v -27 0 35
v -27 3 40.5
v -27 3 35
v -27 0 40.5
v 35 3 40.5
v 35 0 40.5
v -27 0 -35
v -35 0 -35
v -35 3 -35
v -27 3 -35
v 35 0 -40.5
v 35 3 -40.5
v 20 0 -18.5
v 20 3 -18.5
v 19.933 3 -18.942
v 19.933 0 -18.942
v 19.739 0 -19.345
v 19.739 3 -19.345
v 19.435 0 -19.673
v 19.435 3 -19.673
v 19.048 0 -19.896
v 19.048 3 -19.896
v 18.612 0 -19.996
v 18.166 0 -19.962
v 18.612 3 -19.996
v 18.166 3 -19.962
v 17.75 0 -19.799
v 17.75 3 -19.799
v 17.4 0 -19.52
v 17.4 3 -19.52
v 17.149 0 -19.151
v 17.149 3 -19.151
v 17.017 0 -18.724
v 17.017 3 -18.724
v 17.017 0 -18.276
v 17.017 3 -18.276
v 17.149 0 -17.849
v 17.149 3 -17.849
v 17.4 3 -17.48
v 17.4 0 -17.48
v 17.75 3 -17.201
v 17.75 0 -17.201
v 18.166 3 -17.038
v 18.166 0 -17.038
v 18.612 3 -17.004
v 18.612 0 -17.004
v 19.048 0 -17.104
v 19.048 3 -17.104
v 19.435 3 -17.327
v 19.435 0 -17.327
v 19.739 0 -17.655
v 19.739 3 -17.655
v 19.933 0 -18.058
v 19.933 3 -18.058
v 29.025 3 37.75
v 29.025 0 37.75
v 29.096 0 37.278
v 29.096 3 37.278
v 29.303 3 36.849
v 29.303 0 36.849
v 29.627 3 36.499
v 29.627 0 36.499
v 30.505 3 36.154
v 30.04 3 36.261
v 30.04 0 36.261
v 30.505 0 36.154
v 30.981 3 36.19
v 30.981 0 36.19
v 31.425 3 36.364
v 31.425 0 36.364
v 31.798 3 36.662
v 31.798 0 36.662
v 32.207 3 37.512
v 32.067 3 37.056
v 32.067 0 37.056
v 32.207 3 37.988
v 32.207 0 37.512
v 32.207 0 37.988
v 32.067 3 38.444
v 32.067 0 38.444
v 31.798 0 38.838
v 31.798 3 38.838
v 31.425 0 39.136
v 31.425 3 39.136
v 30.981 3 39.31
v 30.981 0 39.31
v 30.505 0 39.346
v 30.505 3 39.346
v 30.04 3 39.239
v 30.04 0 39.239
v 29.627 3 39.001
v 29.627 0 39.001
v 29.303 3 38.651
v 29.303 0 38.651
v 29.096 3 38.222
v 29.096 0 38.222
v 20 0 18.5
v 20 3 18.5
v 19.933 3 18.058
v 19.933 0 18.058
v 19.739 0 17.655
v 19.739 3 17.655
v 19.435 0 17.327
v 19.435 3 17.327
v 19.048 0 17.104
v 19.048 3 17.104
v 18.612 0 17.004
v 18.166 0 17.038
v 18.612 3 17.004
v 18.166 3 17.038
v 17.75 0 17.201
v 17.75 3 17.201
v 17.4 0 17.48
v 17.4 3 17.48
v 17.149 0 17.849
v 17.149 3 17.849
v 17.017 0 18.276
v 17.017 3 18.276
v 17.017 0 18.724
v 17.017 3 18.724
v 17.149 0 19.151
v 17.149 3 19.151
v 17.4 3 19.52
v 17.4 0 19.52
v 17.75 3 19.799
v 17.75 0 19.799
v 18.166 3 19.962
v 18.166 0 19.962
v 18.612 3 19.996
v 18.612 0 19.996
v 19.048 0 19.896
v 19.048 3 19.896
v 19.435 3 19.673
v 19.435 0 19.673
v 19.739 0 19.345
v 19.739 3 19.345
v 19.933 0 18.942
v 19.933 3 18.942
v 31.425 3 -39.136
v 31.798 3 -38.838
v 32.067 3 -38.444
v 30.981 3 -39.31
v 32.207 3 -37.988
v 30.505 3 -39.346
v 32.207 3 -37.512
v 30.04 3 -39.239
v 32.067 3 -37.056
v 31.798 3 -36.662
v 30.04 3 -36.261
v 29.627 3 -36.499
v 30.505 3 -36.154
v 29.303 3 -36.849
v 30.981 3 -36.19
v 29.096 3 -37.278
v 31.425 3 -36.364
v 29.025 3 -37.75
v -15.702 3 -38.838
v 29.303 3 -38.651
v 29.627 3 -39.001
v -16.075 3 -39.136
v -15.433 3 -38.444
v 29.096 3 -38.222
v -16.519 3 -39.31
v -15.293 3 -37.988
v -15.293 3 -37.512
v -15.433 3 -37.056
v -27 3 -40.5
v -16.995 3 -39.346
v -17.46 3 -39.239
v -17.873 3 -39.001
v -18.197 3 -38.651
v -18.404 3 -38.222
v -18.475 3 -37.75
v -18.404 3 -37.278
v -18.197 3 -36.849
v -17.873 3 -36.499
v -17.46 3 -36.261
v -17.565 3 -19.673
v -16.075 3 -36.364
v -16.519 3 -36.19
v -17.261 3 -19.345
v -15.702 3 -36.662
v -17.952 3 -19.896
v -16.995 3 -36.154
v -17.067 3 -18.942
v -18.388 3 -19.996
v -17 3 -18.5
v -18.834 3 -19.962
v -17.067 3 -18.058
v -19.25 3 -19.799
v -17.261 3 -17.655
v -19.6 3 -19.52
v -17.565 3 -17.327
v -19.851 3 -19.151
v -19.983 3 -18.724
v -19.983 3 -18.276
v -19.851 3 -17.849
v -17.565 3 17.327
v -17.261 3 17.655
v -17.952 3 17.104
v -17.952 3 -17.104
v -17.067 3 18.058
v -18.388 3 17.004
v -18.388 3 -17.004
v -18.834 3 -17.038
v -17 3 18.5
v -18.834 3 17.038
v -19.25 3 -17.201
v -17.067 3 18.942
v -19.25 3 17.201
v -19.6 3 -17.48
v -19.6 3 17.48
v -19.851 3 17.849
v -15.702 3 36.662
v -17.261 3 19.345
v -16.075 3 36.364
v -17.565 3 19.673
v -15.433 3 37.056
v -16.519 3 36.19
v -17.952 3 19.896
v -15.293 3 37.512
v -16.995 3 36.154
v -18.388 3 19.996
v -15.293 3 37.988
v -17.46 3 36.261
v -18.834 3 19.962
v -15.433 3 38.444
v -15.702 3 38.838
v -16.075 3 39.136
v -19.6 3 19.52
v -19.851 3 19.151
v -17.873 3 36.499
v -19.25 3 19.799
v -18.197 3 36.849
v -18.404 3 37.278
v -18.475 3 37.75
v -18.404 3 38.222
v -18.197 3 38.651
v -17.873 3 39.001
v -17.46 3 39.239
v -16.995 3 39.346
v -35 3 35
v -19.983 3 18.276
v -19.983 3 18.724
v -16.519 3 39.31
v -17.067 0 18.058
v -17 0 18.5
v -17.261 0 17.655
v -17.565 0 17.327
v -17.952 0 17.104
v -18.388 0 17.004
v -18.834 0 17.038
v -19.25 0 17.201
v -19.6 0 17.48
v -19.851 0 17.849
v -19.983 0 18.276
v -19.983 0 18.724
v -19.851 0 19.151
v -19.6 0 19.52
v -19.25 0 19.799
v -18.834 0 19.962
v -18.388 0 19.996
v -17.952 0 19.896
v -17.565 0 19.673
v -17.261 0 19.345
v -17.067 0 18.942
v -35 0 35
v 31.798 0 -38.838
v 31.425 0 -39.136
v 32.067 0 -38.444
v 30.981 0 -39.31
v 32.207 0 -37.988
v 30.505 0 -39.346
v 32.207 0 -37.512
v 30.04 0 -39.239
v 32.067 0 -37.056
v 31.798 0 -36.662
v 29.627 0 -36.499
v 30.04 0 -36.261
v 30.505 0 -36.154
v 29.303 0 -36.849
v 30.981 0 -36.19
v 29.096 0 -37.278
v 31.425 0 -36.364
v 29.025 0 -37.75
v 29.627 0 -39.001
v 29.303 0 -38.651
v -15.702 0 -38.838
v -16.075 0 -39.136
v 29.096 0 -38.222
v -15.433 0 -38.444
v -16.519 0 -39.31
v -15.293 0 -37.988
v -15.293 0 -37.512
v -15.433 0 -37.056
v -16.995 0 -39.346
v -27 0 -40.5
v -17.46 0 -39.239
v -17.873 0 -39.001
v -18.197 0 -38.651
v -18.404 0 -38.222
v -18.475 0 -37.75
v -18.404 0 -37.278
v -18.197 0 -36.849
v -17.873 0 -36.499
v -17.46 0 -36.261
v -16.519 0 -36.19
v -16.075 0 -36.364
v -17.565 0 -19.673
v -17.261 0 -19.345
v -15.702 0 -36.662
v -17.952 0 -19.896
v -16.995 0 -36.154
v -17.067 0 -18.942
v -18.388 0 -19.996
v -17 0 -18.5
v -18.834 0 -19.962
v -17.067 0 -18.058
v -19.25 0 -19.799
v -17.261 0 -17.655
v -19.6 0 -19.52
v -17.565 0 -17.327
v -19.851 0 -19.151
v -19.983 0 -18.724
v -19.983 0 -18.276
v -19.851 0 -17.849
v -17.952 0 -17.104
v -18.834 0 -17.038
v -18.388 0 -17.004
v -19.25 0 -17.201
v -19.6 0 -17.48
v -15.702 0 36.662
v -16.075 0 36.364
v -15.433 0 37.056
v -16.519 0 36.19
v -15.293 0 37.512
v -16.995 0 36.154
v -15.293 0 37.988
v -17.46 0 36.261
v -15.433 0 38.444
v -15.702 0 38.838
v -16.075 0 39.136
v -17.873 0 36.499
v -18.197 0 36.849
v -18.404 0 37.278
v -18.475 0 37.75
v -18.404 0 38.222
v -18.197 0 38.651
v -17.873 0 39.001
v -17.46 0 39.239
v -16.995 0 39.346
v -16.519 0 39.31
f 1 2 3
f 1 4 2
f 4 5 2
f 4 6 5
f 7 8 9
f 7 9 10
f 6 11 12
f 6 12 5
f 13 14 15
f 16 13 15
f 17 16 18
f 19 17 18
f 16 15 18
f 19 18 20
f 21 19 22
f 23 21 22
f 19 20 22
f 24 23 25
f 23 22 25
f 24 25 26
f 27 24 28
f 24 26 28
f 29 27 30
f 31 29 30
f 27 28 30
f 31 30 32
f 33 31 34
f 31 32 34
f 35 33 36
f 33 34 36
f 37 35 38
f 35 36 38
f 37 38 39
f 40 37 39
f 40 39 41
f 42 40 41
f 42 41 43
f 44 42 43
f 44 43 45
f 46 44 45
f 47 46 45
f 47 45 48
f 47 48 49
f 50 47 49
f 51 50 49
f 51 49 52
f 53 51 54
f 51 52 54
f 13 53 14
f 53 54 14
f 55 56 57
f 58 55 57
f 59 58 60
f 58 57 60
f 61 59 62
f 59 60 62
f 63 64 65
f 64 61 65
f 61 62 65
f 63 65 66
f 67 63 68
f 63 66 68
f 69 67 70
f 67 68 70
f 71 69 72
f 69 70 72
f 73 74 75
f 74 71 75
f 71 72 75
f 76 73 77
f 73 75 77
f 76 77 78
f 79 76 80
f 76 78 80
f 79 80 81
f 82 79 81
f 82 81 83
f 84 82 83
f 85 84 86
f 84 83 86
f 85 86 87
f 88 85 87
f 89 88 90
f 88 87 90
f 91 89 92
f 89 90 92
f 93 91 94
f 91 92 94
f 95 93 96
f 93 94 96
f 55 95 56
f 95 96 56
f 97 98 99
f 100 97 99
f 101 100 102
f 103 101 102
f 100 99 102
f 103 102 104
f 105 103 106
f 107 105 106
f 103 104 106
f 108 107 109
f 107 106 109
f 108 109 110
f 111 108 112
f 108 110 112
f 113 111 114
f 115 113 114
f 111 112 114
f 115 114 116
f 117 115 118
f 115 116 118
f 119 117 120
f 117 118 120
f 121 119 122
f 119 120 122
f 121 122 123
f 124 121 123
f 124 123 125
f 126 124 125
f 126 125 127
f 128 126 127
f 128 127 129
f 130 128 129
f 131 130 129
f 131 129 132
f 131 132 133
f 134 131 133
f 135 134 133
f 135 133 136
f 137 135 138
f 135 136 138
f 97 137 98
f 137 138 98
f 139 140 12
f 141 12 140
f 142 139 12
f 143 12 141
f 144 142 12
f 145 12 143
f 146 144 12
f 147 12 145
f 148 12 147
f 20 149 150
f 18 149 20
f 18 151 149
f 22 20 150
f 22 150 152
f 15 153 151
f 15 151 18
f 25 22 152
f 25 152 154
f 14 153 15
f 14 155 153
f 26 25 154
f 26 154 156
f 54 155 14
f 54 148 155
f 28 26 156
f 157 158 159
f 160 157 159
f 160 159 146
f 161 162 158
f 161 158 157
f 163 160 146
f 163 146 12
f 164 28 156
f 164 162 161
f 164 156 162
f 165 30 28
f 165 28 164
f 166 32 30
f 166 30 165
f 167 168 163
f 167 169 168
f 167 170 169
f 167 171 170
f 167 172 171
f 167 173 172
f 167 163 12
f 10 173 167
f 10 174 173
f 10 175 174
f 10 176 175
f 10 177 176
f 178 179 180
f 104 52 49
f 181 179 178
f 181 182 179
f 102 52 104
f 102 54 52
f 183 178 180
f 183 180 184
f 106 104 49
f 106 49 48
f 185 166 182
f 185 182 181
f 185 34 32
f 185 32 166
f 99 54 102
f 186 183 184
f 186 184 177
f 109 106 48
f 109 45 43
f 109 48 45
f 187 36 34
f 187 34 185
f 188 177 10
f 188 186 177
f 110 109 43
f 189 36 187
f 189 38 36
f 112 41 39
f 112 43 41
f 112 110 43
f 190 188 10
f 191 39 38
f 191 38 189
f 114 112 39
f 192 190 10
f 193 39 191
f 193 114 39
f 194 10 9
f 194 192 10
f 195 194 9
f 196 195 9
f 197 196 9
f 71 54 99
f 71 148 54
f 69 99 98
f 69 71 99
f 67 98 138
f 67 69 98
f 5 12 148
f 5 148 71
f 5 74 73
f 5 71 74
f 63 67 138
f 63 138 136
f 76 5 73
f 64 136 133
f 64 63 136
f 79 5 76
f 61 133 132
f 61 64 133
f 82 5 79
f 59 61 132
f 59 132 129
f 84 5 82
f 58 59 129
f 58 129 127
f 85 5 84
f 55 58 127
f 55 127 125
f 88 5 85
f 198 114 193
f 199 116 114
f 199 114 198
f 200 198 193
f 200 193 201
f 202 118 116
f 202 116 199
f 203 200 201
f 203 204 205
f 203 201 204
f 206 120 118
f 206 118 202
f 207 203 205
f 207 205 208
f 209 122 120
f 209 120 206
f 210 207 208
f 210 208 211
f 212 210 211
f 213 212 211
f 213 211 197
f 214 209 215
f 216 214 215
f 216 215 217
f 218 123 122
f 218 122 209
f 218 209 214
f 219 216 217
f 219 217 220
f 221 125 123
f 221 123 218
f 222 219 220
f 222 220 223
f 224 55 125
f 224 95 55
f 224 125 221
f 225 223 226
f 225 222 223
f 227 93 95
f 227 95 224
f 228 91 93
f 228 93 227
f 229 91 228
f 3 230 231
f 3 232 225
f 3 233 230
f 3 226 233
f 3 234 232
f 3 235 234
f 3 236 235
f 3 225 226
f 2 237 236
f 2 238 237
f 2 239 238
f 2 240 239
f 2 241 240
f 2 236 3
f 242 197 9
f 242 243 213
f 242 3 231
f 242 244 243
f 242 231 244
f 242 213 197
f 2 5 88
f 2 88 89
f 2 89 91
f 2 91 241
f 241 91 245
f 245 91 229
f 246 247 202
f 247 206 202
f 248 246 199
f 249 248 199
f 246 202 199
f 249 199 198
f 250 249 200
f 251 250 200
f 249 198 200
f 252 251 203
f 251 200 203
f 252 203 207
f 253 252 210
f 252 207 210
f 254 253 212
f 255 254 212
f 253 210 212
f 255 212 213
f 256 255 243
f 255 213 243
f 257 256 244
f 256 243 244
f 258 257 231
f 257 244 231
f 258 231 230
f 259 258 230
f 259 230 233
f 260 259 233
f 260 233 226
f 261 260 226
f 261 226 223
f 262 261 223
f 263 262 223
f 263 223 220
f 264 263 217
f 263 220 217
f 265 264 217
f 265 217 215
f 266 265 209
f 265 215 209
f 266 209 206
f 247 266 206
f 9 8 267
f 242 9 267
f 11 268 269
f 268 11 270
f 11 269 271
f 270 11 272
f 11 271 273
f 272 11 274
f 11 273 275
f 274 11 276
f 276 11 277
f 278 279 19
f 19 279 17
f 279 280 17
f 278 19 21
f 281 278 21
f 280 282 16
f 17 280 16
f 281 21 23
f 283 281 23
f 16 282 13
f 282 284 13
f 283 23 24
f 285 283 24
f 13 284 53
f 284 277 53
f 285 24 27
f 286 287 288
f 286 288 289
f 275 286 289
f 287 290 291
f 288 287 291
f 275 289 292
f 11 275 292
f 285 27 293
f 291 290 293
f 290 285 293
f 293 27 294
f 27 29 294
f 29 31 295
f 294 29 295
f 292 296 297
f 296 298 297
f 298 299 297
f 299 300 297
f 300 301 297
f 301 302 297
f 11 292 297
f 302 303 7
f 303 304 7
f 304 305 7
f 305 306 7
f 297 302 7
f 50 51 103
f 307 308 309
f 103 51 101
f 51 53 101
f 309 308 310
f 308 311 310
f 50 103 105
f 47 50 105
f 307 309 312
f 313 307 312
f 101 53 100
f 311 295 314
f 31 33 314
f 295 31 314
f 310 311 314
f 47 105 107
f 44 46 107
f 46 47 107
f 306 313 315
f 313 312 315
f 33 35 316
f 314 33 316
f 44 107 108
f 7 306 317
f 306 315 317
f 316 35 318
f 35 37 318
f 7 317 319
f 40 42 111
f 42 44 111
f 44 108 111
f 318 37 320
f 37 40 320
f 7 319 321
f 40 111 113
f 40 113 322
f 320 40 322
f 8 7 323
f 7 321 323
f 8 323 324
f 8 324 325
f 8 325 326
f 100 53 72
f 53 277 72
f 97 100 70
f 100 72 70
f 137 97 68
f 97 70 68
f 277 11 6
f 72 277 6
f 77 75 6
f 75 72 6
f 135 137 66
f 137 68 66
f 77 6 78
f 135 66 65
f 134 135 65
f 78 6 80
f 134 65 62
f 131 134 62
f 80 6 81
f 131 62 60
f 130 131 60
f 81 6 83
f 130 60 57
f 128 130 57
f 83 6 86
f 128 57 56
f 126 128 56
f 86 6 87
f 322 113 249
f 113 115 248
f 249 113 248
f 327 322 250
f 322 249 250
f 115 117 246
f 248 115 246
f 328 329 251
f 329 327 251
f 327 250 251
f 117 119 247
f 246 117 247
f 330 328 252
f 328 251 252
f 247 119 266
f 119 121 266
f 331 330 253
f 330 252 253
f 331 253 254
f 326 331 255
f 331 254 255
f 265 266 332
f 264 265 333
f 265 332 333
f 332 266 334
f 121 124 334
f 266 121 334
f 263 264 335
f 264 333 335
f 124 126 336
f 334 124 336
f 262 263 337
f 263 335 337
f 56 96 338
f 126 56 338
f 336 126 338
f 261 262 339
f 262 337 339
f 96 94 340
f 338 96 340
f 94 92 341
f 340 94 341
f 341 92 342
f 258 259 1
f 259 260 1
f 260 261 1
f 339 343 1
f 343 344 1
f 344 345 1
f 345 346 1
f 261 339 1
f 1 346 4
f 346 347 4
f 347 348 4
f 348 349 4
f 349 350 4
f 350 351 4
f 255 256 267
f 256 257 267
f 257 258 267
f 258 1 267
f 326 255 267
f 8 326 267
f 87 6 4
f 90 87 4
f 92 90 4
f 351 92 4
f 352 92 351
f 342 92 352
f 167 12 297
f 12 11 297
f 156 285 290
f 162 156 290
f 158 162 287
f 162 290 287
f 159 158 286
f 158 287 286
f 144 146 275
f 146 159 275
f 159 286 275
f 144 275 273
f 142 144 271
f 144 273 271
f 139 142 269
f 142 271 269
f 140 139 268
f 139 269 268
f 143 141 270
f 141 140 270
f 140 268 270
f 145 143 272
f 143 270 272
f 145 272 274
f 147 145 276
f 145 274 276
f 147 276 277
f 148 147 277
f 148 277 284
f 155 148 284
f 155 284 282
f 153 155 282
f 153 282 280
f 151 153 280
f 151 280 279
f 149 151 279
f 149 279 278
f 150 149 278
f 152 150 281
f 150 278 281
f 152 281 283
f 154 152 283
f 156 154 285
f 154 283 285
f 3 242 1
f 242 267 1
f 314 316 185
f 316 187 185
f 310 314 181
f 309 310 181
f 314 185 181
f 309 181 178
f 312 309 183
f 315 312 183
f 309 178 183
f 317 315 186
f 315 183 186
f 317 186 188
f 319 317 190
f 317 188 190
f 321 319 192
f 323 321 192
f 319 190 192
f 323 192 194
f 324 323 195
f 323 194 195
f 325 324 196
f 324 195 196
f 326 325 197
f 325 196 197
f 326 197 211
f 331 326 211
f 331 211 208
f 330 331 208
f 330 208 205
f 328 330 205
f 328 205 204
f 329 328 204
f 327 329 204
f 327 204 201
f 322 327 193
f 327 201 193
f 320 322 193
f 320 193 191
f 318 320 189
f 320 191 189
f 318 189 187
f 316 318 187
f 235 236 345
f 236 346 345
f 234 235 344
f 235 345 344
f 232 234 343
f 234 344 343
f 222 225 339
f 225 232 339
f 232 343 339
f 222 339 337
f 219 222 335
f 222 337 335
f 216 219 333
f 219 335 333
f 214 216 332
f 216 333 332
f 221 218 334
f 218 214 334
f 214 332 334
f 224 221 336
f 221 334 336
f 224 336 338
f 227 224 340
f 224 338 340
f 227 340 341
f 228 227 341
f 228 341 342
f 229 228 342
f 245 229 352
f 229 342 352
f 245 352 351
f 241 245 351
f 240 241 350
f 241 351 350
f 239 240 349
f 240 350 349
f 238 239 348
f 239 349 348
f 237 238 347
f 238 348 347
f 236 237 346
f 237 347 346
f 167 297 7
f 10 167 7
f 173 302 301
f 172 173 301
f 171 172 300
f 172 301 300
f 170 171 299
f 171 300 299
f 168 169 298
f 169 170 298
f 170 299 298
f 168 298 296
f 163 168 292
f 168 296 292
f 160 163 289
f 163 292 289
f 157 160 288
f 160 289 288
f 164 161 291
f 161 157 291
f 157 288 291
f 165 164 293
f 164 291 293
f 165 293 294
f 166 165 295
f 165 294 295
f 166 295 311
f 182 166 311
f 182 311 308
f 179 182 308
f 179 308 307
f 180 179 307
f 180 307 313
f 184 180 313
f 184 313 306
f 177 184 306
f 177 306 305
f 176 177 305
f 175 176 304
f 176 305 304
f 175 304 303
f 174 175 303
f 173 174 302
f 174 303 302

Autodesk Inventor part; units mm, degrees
ref_plane "YZ Plane" through (0, 0, 0) normal (1, 0, 0) x (0, 1, 0)
ref_plane "XZ Plane" through (0, 0, 0) normal (0, 1, 0) x (-1, 0, 0)
ref_plane "XY Plane" through (0, 0, 0) normal (0, 0, 1) x (1, 0, 0)
sketch "Эскиз1" plane through (0, 0, 0) normal (0, 1, 0) x (-1, 0, 0)
  circle A0 centre (16.875, 37.75) radius 1.6
  circle A1 centre (-30.625, 37.75) radius 1.6
  line L0 (-35, 40.5) -> (27, 40.5)
  line L1 (-35, 35) -> (-35, 40.5)
  line L2 (27, 35) -> (-35, 35)
  line L3 (27, 40.5) -> (27, 35)
  circle A2 centre (16.875, -37.75) radius 1.6
  circle A3 centre (-30.625, -37.75) radius 1.6
  line L4 (-35, -40.5) -> (27, -40.5)
  line L5 (27, -40.5) -> (27, -35)
  line L6 (-35, -35) -> (27, -35)
  line L7 (-35, -35) -> (-35, -40.5)
  line L8 (35, -35) -> (27, -35)
  line L9 (35, -35) -> (35, -20)
  line L10 (35, -20) -> (35, 20)
  line L11 (35, 20) -> (35, 35)
  line L12 (35, 35) -> (27, 35)
  line L13 (-35, 20) -> (-35, -20)
  line L14 (-35, 35) -> (-35, 20)
  line L15 (-35, -20) -> (-35, -35)
  point P0 (0, 0)
  point P1 (0, 0)
extrude "Выдавливание1" add sketch "Эскиз1" along normal blind 3
sketch "Эскиз2" plane through (0, 3, 0) normal (0, 1, 0) x (1, 0, 0)
  line L0 (-21.5, -21.875) -> (-21.5, 21.875)
  line L1 (21.5, -21.875) -> (-21.5, -21.875)
  line L2 (21.5, 21.875) -> (21.5, -21.875)
  line L3 (-21.5, 21.875) -> (21.5, 21.875)
  circle A0 centre (18.5, -18.5) radius 1.5
  circle A1 centre (-18.5, -18.5) radius 1.5
  circle A2 centre (-18.5, 18.5) radius 1.5
  circle A3 centre (18.5, 18.5) radius 1.5
  point P0 (0, 0)
  point P1 (0, 0)
extrude "Выдавливание2" cut sketch "Эскиз2" against normal blind 10 contours A0 | A1 | A2 | A3
properties part number "000,105 - Дно переднего сегмента"
